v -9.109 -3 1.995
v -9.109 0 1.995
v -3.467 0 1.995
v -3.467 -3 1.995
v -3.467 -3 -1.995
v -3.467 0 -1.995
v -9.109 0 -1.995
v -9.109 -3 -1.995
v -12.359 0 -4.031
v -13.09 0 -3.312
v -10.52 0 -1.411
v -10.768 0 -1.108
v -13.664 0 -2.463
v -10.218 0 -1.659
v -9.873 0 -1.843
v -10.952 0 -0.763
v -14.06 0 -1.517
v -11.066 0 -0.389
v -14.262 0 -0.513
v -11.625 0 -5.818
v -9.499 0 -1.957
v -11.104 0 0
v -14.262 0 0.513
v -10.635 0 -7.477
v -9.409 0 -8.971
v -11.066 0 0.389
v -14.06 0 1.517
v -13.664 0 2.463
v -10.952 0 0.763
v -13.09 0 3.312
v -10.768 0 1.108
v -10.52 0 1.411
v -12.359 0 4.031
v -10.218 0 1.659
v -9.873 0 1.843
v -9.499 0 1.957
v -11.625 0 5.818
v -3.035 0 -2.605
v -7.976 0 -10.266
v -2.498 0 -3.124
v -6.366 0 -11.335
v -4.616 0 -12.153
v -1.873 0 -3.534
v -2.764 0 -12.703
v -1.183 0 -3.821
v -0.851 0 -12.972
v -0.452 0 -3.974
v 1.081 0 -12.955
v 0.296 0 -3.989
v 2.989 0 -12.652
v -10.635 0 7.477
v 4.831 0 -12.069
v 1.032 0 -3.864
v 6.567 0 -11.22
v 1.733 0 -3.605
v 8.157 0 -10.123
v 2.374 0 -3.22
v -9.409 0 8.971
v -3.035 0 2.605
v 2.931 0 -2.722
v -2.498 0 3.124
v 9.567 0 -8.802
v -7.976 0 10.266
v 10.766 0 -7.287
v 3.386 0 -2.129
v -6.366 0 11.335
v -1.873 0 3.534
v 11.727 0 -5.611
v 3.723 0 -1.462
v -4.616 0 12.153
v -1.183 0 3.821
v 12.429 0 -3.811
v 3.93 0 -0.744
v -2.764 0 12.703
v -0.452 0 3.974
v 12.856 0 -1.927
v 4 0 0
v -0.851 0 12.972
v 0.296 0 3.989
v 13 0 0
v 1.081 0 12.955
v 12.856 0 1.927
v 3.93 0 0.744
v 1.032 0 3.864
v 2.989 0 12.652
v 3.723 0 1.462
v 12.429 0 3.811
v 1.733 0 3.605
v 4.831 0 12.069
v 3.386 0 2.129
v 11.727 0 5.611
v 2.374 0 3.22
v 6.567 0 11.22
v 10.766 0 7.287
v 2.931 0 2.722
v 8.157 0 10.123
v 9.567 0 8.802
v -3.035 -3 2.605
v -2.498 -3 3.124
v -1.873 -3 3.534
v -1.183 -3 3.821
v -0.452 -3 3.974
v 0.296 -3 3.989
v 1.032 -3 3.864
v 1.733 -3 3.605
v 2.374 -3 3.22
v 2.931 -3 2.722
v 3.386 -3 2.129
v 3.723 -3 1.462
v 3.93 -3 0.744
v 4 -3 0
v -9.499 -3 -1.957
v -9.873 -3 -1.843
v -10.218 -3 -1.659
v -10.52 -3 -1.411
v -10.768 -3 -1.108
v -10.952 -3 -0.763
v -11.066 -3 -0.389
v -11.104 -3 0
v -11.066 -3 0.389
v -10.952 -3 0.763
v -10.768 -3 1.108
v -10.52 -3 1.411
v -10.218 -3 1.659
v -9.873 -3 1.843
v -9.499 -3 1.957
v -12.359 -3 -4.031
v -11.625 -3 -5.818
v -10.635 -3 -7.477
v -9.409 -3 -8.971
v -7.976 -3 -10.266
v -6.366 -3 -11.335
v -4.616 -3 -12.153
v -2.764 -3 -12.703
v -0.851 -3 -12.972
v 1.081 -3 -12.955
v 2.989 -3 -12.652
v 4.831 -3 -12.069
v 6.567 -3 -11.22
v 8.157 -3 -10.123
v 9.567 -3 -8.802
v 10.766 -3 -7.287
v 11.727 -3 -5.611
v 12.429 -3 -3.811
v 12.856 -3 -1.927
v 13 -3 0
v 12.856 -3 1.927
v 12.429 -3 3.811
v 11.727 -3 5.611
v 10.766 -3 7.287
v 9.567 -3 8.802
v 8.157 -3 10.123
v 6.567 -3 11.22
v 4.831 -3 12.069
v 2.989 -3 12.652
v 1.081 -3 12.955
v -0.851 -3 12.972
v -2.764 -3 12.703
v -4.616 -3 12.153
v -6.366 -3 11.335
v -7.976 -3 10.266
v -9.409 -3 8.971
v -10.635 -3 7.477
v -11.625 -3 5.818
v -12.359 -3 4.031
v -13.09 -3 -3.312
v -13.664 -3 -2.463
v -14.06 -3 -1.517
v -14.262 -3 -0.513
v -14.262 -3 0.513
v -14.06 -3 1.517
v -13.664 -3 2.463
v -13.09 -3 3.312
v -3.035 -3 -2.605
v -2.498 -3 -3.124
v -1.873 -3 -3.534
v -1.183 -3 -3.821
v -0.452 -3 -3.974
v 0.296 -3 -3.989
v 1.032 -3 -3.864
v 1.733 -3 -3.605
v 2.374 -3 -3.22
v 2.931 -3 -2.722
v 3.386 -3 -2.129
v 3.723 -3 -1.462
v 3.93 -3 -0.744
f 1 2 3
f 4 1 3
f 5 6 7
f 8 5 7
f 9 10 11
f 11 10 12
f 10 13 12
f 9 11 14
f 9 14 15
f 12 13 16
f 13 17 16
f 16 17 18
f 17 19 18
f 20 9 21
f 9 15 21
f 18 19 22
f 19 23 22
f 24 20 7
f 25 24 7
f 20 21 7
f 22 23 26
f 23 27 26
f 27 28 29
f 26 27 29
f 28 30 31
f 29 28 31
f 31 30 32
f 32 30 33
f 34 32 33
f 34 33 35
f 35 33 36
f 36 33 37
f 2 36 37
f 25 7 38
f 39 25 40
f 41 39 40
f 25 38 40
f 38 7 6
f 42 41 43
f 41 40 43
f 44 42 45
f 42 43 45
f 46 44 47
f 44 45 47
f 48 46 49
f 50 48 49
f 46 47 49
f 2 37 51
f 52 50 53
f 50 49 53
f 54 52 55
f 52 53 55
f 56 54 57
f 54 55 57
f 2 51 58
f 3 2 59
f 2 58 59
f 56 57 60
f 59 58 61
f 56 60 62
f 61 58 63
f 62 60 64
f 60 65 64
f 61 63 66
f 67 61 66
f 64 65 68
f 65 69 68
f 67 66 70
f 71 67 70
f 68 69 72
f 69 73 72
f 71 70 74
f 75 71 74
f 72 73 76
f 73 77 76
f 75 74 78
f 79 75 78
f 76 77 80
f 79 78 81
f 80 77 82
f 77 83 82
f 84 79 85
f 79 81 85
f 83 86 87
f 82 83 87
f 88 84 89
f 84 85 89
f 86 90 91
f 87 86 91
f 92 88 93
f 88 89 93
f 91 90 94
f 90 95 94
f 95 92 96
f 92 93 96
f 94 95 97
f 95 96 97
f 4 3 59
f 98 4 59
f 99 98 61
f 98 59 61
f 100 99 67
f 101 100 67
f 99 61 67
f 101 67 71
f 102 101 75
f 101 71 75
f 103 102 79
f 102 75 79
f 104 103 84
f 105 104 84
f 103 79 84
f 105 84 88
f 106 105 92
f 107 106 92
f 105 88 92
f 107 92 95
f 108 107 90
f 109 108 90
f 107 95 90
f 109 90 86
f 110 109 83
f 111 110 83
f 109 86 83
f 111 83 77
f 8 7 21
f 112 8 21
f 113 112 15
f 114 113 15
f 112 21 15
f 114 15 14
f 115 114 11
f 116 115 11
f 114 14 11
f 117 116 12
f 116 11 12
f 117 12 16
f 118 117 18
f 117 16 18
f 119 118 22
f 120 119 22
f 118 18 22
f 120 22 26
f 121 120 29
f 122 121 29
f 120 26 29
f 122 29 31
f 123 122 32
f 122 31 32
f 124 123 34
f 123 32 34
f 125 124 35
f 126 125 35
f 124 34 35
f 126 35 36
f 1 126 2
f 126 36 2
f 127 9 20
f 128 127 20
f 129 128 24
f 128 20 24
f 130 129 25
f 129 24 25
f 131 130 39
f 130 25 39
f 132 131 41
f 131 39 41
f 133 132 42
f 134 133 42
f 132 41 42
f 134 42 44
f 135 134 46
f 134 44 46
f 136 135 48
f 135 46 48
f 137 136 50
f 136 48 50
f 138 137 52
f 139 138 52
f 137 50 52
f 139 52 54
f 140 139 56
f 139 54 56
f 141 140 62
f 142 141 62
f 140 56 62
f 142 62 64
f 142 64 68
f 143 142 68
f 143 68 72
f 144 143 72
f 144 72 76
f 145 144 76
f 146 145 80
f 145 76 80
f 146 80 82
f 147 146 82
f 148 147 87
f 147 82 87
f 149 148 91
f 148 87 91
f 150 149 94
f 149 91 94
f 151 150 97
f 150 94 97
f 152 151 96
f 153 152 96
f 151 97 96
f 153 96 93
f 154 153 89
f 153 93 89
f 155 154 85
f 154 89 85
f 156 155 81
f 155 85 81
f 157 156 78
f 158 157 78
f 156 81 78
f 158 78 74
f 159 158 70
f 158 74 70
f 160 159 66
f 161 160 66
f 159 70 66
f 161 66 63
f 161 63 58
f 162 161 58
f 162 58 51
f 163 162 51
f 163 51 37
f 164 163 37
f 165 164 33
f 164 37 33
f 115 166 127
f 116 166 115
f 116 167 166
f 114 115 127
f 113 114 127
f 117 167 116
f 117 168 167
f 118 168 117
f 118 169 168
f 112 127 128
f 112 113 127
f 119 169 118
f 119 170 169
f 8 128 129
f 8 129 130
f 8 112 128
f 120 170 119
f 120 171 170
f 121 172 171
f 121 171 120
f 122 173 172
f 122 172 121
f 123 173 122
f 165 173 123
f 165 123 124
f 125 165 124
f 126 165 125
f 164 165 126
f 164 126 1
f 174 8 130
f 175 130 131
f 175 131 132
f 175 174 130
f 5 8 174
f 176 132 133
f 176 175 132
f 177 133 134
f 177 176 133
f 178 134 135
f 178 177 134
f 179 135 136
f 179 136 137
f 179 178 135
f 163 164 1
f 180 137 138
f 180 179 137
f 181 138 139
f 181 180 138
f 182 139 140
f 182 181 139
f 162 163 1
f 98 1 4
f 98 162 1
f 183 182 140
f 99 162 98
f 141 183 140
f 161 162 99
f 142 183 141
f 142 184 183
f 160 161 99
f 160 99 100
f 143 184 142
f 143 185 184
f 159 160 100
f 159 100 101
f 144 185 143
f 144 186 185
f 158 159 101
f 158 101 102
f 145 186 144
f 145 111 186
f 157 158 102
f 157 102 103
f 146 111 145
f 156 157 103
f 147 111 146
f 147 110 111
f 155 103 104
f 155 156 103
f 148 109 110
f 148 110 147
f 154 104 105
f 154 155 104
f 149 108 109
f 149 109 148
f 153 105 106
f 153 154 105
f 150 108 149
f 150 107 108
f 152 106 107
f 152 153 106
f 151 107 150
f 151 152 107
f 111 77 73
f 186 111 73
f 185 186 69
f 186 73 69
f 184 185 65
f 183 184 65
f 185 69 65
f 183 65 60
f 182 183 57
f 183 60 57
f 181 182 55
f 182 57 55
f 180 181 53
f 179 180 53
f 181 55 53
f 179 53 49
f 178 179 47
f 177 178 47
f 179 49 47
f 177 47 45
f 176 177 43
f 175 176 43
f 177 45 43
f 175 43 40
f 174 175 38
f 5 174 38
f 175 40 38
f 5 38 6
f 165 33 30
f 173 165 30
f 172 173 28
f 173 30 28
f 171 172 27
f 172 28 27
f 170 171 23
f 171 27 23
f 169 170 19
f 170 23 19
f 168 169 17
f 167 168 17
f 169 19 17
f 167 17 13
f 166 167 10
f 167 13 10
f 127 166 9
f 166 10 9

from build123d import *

# Parameters (mm, degrees)
F1_DEPTH = 3


with BuildPart() as f1:
    # F0 (on Front) → F1 (new body)
    with BuildSketch(Plane.XZ):
        with BuildLine():
            Line((-9.1093318323, 1.994954946), (-4.331072879, 1.994954946))
            ThreePointArc((-4.331072879, 1.994954946), (-7.8363542053, 5.0190767898), (-12.3592117795, 4.0311145096))
            ThreePointArc((-12.3592117795, 4.0311145096), (-13, 0), (-12.3592117795, -4.0311145096))
            ThreePointArc((-12.3592117795, -4.0311145096), (-7.8363542053, -5.0190767898), (-4.331072879, -1.994954946))
            Line((-4.331072879, -1.994954946), (-9.1093318323, -1.994954946))
            ThreePointArc((-9.1093318323, -1.994954946), (-11.1042867783, 0), (-9.1093318323, 1.994954946))
        make_face()
        with BuildLine():
            ThreePointArc((-3.4670094842, 1.994954946), (1.032463574, 3.8644558438), (4, 0))
            ThreePointArc((4, 0), (1.032463574, -3.8644558438), (-3.4670094842, -1.994954946))
            Line((-3.4670094842, -1.994954946), (-4.331072879, -1.994954946))
            ThreePointArc((-4.331072879, -1.994954946), (-7.8363542053, -5.0190767898), (-12.3592117795, -4.0311145096))
            ThreePointArc((-12.3592117795, -4.0311145096), (2.0408634039, -12.8388035489), (13, 0))
            ThreePointArc((13, 0), (2.0408634039, 12.8388035489), (-12.3592117795, 4.0311145096))
            ThreePointArc((-12.3592117795, 4.0311145096), (-7.8363542053, 5.0190767898), (-4.331072879, 1.994954946))
            Line((-4.331072879, 1.994954946), (-3.4670094842, 1.994954946))
        make_face()
        with BuildLine():
            ThreePointArc((-12.3592117795, -4.0311145096), (-13, 0), (-12.3592117795, 4.0311145096))
            ThreePointArc((-12.3592117795, 4.0311145096), (-14.2873240939, 0), (-12.3592117795, -4.0311145096))
        make_face()
    extrude(amount=F1_DEPTH)


solid = f1.part
